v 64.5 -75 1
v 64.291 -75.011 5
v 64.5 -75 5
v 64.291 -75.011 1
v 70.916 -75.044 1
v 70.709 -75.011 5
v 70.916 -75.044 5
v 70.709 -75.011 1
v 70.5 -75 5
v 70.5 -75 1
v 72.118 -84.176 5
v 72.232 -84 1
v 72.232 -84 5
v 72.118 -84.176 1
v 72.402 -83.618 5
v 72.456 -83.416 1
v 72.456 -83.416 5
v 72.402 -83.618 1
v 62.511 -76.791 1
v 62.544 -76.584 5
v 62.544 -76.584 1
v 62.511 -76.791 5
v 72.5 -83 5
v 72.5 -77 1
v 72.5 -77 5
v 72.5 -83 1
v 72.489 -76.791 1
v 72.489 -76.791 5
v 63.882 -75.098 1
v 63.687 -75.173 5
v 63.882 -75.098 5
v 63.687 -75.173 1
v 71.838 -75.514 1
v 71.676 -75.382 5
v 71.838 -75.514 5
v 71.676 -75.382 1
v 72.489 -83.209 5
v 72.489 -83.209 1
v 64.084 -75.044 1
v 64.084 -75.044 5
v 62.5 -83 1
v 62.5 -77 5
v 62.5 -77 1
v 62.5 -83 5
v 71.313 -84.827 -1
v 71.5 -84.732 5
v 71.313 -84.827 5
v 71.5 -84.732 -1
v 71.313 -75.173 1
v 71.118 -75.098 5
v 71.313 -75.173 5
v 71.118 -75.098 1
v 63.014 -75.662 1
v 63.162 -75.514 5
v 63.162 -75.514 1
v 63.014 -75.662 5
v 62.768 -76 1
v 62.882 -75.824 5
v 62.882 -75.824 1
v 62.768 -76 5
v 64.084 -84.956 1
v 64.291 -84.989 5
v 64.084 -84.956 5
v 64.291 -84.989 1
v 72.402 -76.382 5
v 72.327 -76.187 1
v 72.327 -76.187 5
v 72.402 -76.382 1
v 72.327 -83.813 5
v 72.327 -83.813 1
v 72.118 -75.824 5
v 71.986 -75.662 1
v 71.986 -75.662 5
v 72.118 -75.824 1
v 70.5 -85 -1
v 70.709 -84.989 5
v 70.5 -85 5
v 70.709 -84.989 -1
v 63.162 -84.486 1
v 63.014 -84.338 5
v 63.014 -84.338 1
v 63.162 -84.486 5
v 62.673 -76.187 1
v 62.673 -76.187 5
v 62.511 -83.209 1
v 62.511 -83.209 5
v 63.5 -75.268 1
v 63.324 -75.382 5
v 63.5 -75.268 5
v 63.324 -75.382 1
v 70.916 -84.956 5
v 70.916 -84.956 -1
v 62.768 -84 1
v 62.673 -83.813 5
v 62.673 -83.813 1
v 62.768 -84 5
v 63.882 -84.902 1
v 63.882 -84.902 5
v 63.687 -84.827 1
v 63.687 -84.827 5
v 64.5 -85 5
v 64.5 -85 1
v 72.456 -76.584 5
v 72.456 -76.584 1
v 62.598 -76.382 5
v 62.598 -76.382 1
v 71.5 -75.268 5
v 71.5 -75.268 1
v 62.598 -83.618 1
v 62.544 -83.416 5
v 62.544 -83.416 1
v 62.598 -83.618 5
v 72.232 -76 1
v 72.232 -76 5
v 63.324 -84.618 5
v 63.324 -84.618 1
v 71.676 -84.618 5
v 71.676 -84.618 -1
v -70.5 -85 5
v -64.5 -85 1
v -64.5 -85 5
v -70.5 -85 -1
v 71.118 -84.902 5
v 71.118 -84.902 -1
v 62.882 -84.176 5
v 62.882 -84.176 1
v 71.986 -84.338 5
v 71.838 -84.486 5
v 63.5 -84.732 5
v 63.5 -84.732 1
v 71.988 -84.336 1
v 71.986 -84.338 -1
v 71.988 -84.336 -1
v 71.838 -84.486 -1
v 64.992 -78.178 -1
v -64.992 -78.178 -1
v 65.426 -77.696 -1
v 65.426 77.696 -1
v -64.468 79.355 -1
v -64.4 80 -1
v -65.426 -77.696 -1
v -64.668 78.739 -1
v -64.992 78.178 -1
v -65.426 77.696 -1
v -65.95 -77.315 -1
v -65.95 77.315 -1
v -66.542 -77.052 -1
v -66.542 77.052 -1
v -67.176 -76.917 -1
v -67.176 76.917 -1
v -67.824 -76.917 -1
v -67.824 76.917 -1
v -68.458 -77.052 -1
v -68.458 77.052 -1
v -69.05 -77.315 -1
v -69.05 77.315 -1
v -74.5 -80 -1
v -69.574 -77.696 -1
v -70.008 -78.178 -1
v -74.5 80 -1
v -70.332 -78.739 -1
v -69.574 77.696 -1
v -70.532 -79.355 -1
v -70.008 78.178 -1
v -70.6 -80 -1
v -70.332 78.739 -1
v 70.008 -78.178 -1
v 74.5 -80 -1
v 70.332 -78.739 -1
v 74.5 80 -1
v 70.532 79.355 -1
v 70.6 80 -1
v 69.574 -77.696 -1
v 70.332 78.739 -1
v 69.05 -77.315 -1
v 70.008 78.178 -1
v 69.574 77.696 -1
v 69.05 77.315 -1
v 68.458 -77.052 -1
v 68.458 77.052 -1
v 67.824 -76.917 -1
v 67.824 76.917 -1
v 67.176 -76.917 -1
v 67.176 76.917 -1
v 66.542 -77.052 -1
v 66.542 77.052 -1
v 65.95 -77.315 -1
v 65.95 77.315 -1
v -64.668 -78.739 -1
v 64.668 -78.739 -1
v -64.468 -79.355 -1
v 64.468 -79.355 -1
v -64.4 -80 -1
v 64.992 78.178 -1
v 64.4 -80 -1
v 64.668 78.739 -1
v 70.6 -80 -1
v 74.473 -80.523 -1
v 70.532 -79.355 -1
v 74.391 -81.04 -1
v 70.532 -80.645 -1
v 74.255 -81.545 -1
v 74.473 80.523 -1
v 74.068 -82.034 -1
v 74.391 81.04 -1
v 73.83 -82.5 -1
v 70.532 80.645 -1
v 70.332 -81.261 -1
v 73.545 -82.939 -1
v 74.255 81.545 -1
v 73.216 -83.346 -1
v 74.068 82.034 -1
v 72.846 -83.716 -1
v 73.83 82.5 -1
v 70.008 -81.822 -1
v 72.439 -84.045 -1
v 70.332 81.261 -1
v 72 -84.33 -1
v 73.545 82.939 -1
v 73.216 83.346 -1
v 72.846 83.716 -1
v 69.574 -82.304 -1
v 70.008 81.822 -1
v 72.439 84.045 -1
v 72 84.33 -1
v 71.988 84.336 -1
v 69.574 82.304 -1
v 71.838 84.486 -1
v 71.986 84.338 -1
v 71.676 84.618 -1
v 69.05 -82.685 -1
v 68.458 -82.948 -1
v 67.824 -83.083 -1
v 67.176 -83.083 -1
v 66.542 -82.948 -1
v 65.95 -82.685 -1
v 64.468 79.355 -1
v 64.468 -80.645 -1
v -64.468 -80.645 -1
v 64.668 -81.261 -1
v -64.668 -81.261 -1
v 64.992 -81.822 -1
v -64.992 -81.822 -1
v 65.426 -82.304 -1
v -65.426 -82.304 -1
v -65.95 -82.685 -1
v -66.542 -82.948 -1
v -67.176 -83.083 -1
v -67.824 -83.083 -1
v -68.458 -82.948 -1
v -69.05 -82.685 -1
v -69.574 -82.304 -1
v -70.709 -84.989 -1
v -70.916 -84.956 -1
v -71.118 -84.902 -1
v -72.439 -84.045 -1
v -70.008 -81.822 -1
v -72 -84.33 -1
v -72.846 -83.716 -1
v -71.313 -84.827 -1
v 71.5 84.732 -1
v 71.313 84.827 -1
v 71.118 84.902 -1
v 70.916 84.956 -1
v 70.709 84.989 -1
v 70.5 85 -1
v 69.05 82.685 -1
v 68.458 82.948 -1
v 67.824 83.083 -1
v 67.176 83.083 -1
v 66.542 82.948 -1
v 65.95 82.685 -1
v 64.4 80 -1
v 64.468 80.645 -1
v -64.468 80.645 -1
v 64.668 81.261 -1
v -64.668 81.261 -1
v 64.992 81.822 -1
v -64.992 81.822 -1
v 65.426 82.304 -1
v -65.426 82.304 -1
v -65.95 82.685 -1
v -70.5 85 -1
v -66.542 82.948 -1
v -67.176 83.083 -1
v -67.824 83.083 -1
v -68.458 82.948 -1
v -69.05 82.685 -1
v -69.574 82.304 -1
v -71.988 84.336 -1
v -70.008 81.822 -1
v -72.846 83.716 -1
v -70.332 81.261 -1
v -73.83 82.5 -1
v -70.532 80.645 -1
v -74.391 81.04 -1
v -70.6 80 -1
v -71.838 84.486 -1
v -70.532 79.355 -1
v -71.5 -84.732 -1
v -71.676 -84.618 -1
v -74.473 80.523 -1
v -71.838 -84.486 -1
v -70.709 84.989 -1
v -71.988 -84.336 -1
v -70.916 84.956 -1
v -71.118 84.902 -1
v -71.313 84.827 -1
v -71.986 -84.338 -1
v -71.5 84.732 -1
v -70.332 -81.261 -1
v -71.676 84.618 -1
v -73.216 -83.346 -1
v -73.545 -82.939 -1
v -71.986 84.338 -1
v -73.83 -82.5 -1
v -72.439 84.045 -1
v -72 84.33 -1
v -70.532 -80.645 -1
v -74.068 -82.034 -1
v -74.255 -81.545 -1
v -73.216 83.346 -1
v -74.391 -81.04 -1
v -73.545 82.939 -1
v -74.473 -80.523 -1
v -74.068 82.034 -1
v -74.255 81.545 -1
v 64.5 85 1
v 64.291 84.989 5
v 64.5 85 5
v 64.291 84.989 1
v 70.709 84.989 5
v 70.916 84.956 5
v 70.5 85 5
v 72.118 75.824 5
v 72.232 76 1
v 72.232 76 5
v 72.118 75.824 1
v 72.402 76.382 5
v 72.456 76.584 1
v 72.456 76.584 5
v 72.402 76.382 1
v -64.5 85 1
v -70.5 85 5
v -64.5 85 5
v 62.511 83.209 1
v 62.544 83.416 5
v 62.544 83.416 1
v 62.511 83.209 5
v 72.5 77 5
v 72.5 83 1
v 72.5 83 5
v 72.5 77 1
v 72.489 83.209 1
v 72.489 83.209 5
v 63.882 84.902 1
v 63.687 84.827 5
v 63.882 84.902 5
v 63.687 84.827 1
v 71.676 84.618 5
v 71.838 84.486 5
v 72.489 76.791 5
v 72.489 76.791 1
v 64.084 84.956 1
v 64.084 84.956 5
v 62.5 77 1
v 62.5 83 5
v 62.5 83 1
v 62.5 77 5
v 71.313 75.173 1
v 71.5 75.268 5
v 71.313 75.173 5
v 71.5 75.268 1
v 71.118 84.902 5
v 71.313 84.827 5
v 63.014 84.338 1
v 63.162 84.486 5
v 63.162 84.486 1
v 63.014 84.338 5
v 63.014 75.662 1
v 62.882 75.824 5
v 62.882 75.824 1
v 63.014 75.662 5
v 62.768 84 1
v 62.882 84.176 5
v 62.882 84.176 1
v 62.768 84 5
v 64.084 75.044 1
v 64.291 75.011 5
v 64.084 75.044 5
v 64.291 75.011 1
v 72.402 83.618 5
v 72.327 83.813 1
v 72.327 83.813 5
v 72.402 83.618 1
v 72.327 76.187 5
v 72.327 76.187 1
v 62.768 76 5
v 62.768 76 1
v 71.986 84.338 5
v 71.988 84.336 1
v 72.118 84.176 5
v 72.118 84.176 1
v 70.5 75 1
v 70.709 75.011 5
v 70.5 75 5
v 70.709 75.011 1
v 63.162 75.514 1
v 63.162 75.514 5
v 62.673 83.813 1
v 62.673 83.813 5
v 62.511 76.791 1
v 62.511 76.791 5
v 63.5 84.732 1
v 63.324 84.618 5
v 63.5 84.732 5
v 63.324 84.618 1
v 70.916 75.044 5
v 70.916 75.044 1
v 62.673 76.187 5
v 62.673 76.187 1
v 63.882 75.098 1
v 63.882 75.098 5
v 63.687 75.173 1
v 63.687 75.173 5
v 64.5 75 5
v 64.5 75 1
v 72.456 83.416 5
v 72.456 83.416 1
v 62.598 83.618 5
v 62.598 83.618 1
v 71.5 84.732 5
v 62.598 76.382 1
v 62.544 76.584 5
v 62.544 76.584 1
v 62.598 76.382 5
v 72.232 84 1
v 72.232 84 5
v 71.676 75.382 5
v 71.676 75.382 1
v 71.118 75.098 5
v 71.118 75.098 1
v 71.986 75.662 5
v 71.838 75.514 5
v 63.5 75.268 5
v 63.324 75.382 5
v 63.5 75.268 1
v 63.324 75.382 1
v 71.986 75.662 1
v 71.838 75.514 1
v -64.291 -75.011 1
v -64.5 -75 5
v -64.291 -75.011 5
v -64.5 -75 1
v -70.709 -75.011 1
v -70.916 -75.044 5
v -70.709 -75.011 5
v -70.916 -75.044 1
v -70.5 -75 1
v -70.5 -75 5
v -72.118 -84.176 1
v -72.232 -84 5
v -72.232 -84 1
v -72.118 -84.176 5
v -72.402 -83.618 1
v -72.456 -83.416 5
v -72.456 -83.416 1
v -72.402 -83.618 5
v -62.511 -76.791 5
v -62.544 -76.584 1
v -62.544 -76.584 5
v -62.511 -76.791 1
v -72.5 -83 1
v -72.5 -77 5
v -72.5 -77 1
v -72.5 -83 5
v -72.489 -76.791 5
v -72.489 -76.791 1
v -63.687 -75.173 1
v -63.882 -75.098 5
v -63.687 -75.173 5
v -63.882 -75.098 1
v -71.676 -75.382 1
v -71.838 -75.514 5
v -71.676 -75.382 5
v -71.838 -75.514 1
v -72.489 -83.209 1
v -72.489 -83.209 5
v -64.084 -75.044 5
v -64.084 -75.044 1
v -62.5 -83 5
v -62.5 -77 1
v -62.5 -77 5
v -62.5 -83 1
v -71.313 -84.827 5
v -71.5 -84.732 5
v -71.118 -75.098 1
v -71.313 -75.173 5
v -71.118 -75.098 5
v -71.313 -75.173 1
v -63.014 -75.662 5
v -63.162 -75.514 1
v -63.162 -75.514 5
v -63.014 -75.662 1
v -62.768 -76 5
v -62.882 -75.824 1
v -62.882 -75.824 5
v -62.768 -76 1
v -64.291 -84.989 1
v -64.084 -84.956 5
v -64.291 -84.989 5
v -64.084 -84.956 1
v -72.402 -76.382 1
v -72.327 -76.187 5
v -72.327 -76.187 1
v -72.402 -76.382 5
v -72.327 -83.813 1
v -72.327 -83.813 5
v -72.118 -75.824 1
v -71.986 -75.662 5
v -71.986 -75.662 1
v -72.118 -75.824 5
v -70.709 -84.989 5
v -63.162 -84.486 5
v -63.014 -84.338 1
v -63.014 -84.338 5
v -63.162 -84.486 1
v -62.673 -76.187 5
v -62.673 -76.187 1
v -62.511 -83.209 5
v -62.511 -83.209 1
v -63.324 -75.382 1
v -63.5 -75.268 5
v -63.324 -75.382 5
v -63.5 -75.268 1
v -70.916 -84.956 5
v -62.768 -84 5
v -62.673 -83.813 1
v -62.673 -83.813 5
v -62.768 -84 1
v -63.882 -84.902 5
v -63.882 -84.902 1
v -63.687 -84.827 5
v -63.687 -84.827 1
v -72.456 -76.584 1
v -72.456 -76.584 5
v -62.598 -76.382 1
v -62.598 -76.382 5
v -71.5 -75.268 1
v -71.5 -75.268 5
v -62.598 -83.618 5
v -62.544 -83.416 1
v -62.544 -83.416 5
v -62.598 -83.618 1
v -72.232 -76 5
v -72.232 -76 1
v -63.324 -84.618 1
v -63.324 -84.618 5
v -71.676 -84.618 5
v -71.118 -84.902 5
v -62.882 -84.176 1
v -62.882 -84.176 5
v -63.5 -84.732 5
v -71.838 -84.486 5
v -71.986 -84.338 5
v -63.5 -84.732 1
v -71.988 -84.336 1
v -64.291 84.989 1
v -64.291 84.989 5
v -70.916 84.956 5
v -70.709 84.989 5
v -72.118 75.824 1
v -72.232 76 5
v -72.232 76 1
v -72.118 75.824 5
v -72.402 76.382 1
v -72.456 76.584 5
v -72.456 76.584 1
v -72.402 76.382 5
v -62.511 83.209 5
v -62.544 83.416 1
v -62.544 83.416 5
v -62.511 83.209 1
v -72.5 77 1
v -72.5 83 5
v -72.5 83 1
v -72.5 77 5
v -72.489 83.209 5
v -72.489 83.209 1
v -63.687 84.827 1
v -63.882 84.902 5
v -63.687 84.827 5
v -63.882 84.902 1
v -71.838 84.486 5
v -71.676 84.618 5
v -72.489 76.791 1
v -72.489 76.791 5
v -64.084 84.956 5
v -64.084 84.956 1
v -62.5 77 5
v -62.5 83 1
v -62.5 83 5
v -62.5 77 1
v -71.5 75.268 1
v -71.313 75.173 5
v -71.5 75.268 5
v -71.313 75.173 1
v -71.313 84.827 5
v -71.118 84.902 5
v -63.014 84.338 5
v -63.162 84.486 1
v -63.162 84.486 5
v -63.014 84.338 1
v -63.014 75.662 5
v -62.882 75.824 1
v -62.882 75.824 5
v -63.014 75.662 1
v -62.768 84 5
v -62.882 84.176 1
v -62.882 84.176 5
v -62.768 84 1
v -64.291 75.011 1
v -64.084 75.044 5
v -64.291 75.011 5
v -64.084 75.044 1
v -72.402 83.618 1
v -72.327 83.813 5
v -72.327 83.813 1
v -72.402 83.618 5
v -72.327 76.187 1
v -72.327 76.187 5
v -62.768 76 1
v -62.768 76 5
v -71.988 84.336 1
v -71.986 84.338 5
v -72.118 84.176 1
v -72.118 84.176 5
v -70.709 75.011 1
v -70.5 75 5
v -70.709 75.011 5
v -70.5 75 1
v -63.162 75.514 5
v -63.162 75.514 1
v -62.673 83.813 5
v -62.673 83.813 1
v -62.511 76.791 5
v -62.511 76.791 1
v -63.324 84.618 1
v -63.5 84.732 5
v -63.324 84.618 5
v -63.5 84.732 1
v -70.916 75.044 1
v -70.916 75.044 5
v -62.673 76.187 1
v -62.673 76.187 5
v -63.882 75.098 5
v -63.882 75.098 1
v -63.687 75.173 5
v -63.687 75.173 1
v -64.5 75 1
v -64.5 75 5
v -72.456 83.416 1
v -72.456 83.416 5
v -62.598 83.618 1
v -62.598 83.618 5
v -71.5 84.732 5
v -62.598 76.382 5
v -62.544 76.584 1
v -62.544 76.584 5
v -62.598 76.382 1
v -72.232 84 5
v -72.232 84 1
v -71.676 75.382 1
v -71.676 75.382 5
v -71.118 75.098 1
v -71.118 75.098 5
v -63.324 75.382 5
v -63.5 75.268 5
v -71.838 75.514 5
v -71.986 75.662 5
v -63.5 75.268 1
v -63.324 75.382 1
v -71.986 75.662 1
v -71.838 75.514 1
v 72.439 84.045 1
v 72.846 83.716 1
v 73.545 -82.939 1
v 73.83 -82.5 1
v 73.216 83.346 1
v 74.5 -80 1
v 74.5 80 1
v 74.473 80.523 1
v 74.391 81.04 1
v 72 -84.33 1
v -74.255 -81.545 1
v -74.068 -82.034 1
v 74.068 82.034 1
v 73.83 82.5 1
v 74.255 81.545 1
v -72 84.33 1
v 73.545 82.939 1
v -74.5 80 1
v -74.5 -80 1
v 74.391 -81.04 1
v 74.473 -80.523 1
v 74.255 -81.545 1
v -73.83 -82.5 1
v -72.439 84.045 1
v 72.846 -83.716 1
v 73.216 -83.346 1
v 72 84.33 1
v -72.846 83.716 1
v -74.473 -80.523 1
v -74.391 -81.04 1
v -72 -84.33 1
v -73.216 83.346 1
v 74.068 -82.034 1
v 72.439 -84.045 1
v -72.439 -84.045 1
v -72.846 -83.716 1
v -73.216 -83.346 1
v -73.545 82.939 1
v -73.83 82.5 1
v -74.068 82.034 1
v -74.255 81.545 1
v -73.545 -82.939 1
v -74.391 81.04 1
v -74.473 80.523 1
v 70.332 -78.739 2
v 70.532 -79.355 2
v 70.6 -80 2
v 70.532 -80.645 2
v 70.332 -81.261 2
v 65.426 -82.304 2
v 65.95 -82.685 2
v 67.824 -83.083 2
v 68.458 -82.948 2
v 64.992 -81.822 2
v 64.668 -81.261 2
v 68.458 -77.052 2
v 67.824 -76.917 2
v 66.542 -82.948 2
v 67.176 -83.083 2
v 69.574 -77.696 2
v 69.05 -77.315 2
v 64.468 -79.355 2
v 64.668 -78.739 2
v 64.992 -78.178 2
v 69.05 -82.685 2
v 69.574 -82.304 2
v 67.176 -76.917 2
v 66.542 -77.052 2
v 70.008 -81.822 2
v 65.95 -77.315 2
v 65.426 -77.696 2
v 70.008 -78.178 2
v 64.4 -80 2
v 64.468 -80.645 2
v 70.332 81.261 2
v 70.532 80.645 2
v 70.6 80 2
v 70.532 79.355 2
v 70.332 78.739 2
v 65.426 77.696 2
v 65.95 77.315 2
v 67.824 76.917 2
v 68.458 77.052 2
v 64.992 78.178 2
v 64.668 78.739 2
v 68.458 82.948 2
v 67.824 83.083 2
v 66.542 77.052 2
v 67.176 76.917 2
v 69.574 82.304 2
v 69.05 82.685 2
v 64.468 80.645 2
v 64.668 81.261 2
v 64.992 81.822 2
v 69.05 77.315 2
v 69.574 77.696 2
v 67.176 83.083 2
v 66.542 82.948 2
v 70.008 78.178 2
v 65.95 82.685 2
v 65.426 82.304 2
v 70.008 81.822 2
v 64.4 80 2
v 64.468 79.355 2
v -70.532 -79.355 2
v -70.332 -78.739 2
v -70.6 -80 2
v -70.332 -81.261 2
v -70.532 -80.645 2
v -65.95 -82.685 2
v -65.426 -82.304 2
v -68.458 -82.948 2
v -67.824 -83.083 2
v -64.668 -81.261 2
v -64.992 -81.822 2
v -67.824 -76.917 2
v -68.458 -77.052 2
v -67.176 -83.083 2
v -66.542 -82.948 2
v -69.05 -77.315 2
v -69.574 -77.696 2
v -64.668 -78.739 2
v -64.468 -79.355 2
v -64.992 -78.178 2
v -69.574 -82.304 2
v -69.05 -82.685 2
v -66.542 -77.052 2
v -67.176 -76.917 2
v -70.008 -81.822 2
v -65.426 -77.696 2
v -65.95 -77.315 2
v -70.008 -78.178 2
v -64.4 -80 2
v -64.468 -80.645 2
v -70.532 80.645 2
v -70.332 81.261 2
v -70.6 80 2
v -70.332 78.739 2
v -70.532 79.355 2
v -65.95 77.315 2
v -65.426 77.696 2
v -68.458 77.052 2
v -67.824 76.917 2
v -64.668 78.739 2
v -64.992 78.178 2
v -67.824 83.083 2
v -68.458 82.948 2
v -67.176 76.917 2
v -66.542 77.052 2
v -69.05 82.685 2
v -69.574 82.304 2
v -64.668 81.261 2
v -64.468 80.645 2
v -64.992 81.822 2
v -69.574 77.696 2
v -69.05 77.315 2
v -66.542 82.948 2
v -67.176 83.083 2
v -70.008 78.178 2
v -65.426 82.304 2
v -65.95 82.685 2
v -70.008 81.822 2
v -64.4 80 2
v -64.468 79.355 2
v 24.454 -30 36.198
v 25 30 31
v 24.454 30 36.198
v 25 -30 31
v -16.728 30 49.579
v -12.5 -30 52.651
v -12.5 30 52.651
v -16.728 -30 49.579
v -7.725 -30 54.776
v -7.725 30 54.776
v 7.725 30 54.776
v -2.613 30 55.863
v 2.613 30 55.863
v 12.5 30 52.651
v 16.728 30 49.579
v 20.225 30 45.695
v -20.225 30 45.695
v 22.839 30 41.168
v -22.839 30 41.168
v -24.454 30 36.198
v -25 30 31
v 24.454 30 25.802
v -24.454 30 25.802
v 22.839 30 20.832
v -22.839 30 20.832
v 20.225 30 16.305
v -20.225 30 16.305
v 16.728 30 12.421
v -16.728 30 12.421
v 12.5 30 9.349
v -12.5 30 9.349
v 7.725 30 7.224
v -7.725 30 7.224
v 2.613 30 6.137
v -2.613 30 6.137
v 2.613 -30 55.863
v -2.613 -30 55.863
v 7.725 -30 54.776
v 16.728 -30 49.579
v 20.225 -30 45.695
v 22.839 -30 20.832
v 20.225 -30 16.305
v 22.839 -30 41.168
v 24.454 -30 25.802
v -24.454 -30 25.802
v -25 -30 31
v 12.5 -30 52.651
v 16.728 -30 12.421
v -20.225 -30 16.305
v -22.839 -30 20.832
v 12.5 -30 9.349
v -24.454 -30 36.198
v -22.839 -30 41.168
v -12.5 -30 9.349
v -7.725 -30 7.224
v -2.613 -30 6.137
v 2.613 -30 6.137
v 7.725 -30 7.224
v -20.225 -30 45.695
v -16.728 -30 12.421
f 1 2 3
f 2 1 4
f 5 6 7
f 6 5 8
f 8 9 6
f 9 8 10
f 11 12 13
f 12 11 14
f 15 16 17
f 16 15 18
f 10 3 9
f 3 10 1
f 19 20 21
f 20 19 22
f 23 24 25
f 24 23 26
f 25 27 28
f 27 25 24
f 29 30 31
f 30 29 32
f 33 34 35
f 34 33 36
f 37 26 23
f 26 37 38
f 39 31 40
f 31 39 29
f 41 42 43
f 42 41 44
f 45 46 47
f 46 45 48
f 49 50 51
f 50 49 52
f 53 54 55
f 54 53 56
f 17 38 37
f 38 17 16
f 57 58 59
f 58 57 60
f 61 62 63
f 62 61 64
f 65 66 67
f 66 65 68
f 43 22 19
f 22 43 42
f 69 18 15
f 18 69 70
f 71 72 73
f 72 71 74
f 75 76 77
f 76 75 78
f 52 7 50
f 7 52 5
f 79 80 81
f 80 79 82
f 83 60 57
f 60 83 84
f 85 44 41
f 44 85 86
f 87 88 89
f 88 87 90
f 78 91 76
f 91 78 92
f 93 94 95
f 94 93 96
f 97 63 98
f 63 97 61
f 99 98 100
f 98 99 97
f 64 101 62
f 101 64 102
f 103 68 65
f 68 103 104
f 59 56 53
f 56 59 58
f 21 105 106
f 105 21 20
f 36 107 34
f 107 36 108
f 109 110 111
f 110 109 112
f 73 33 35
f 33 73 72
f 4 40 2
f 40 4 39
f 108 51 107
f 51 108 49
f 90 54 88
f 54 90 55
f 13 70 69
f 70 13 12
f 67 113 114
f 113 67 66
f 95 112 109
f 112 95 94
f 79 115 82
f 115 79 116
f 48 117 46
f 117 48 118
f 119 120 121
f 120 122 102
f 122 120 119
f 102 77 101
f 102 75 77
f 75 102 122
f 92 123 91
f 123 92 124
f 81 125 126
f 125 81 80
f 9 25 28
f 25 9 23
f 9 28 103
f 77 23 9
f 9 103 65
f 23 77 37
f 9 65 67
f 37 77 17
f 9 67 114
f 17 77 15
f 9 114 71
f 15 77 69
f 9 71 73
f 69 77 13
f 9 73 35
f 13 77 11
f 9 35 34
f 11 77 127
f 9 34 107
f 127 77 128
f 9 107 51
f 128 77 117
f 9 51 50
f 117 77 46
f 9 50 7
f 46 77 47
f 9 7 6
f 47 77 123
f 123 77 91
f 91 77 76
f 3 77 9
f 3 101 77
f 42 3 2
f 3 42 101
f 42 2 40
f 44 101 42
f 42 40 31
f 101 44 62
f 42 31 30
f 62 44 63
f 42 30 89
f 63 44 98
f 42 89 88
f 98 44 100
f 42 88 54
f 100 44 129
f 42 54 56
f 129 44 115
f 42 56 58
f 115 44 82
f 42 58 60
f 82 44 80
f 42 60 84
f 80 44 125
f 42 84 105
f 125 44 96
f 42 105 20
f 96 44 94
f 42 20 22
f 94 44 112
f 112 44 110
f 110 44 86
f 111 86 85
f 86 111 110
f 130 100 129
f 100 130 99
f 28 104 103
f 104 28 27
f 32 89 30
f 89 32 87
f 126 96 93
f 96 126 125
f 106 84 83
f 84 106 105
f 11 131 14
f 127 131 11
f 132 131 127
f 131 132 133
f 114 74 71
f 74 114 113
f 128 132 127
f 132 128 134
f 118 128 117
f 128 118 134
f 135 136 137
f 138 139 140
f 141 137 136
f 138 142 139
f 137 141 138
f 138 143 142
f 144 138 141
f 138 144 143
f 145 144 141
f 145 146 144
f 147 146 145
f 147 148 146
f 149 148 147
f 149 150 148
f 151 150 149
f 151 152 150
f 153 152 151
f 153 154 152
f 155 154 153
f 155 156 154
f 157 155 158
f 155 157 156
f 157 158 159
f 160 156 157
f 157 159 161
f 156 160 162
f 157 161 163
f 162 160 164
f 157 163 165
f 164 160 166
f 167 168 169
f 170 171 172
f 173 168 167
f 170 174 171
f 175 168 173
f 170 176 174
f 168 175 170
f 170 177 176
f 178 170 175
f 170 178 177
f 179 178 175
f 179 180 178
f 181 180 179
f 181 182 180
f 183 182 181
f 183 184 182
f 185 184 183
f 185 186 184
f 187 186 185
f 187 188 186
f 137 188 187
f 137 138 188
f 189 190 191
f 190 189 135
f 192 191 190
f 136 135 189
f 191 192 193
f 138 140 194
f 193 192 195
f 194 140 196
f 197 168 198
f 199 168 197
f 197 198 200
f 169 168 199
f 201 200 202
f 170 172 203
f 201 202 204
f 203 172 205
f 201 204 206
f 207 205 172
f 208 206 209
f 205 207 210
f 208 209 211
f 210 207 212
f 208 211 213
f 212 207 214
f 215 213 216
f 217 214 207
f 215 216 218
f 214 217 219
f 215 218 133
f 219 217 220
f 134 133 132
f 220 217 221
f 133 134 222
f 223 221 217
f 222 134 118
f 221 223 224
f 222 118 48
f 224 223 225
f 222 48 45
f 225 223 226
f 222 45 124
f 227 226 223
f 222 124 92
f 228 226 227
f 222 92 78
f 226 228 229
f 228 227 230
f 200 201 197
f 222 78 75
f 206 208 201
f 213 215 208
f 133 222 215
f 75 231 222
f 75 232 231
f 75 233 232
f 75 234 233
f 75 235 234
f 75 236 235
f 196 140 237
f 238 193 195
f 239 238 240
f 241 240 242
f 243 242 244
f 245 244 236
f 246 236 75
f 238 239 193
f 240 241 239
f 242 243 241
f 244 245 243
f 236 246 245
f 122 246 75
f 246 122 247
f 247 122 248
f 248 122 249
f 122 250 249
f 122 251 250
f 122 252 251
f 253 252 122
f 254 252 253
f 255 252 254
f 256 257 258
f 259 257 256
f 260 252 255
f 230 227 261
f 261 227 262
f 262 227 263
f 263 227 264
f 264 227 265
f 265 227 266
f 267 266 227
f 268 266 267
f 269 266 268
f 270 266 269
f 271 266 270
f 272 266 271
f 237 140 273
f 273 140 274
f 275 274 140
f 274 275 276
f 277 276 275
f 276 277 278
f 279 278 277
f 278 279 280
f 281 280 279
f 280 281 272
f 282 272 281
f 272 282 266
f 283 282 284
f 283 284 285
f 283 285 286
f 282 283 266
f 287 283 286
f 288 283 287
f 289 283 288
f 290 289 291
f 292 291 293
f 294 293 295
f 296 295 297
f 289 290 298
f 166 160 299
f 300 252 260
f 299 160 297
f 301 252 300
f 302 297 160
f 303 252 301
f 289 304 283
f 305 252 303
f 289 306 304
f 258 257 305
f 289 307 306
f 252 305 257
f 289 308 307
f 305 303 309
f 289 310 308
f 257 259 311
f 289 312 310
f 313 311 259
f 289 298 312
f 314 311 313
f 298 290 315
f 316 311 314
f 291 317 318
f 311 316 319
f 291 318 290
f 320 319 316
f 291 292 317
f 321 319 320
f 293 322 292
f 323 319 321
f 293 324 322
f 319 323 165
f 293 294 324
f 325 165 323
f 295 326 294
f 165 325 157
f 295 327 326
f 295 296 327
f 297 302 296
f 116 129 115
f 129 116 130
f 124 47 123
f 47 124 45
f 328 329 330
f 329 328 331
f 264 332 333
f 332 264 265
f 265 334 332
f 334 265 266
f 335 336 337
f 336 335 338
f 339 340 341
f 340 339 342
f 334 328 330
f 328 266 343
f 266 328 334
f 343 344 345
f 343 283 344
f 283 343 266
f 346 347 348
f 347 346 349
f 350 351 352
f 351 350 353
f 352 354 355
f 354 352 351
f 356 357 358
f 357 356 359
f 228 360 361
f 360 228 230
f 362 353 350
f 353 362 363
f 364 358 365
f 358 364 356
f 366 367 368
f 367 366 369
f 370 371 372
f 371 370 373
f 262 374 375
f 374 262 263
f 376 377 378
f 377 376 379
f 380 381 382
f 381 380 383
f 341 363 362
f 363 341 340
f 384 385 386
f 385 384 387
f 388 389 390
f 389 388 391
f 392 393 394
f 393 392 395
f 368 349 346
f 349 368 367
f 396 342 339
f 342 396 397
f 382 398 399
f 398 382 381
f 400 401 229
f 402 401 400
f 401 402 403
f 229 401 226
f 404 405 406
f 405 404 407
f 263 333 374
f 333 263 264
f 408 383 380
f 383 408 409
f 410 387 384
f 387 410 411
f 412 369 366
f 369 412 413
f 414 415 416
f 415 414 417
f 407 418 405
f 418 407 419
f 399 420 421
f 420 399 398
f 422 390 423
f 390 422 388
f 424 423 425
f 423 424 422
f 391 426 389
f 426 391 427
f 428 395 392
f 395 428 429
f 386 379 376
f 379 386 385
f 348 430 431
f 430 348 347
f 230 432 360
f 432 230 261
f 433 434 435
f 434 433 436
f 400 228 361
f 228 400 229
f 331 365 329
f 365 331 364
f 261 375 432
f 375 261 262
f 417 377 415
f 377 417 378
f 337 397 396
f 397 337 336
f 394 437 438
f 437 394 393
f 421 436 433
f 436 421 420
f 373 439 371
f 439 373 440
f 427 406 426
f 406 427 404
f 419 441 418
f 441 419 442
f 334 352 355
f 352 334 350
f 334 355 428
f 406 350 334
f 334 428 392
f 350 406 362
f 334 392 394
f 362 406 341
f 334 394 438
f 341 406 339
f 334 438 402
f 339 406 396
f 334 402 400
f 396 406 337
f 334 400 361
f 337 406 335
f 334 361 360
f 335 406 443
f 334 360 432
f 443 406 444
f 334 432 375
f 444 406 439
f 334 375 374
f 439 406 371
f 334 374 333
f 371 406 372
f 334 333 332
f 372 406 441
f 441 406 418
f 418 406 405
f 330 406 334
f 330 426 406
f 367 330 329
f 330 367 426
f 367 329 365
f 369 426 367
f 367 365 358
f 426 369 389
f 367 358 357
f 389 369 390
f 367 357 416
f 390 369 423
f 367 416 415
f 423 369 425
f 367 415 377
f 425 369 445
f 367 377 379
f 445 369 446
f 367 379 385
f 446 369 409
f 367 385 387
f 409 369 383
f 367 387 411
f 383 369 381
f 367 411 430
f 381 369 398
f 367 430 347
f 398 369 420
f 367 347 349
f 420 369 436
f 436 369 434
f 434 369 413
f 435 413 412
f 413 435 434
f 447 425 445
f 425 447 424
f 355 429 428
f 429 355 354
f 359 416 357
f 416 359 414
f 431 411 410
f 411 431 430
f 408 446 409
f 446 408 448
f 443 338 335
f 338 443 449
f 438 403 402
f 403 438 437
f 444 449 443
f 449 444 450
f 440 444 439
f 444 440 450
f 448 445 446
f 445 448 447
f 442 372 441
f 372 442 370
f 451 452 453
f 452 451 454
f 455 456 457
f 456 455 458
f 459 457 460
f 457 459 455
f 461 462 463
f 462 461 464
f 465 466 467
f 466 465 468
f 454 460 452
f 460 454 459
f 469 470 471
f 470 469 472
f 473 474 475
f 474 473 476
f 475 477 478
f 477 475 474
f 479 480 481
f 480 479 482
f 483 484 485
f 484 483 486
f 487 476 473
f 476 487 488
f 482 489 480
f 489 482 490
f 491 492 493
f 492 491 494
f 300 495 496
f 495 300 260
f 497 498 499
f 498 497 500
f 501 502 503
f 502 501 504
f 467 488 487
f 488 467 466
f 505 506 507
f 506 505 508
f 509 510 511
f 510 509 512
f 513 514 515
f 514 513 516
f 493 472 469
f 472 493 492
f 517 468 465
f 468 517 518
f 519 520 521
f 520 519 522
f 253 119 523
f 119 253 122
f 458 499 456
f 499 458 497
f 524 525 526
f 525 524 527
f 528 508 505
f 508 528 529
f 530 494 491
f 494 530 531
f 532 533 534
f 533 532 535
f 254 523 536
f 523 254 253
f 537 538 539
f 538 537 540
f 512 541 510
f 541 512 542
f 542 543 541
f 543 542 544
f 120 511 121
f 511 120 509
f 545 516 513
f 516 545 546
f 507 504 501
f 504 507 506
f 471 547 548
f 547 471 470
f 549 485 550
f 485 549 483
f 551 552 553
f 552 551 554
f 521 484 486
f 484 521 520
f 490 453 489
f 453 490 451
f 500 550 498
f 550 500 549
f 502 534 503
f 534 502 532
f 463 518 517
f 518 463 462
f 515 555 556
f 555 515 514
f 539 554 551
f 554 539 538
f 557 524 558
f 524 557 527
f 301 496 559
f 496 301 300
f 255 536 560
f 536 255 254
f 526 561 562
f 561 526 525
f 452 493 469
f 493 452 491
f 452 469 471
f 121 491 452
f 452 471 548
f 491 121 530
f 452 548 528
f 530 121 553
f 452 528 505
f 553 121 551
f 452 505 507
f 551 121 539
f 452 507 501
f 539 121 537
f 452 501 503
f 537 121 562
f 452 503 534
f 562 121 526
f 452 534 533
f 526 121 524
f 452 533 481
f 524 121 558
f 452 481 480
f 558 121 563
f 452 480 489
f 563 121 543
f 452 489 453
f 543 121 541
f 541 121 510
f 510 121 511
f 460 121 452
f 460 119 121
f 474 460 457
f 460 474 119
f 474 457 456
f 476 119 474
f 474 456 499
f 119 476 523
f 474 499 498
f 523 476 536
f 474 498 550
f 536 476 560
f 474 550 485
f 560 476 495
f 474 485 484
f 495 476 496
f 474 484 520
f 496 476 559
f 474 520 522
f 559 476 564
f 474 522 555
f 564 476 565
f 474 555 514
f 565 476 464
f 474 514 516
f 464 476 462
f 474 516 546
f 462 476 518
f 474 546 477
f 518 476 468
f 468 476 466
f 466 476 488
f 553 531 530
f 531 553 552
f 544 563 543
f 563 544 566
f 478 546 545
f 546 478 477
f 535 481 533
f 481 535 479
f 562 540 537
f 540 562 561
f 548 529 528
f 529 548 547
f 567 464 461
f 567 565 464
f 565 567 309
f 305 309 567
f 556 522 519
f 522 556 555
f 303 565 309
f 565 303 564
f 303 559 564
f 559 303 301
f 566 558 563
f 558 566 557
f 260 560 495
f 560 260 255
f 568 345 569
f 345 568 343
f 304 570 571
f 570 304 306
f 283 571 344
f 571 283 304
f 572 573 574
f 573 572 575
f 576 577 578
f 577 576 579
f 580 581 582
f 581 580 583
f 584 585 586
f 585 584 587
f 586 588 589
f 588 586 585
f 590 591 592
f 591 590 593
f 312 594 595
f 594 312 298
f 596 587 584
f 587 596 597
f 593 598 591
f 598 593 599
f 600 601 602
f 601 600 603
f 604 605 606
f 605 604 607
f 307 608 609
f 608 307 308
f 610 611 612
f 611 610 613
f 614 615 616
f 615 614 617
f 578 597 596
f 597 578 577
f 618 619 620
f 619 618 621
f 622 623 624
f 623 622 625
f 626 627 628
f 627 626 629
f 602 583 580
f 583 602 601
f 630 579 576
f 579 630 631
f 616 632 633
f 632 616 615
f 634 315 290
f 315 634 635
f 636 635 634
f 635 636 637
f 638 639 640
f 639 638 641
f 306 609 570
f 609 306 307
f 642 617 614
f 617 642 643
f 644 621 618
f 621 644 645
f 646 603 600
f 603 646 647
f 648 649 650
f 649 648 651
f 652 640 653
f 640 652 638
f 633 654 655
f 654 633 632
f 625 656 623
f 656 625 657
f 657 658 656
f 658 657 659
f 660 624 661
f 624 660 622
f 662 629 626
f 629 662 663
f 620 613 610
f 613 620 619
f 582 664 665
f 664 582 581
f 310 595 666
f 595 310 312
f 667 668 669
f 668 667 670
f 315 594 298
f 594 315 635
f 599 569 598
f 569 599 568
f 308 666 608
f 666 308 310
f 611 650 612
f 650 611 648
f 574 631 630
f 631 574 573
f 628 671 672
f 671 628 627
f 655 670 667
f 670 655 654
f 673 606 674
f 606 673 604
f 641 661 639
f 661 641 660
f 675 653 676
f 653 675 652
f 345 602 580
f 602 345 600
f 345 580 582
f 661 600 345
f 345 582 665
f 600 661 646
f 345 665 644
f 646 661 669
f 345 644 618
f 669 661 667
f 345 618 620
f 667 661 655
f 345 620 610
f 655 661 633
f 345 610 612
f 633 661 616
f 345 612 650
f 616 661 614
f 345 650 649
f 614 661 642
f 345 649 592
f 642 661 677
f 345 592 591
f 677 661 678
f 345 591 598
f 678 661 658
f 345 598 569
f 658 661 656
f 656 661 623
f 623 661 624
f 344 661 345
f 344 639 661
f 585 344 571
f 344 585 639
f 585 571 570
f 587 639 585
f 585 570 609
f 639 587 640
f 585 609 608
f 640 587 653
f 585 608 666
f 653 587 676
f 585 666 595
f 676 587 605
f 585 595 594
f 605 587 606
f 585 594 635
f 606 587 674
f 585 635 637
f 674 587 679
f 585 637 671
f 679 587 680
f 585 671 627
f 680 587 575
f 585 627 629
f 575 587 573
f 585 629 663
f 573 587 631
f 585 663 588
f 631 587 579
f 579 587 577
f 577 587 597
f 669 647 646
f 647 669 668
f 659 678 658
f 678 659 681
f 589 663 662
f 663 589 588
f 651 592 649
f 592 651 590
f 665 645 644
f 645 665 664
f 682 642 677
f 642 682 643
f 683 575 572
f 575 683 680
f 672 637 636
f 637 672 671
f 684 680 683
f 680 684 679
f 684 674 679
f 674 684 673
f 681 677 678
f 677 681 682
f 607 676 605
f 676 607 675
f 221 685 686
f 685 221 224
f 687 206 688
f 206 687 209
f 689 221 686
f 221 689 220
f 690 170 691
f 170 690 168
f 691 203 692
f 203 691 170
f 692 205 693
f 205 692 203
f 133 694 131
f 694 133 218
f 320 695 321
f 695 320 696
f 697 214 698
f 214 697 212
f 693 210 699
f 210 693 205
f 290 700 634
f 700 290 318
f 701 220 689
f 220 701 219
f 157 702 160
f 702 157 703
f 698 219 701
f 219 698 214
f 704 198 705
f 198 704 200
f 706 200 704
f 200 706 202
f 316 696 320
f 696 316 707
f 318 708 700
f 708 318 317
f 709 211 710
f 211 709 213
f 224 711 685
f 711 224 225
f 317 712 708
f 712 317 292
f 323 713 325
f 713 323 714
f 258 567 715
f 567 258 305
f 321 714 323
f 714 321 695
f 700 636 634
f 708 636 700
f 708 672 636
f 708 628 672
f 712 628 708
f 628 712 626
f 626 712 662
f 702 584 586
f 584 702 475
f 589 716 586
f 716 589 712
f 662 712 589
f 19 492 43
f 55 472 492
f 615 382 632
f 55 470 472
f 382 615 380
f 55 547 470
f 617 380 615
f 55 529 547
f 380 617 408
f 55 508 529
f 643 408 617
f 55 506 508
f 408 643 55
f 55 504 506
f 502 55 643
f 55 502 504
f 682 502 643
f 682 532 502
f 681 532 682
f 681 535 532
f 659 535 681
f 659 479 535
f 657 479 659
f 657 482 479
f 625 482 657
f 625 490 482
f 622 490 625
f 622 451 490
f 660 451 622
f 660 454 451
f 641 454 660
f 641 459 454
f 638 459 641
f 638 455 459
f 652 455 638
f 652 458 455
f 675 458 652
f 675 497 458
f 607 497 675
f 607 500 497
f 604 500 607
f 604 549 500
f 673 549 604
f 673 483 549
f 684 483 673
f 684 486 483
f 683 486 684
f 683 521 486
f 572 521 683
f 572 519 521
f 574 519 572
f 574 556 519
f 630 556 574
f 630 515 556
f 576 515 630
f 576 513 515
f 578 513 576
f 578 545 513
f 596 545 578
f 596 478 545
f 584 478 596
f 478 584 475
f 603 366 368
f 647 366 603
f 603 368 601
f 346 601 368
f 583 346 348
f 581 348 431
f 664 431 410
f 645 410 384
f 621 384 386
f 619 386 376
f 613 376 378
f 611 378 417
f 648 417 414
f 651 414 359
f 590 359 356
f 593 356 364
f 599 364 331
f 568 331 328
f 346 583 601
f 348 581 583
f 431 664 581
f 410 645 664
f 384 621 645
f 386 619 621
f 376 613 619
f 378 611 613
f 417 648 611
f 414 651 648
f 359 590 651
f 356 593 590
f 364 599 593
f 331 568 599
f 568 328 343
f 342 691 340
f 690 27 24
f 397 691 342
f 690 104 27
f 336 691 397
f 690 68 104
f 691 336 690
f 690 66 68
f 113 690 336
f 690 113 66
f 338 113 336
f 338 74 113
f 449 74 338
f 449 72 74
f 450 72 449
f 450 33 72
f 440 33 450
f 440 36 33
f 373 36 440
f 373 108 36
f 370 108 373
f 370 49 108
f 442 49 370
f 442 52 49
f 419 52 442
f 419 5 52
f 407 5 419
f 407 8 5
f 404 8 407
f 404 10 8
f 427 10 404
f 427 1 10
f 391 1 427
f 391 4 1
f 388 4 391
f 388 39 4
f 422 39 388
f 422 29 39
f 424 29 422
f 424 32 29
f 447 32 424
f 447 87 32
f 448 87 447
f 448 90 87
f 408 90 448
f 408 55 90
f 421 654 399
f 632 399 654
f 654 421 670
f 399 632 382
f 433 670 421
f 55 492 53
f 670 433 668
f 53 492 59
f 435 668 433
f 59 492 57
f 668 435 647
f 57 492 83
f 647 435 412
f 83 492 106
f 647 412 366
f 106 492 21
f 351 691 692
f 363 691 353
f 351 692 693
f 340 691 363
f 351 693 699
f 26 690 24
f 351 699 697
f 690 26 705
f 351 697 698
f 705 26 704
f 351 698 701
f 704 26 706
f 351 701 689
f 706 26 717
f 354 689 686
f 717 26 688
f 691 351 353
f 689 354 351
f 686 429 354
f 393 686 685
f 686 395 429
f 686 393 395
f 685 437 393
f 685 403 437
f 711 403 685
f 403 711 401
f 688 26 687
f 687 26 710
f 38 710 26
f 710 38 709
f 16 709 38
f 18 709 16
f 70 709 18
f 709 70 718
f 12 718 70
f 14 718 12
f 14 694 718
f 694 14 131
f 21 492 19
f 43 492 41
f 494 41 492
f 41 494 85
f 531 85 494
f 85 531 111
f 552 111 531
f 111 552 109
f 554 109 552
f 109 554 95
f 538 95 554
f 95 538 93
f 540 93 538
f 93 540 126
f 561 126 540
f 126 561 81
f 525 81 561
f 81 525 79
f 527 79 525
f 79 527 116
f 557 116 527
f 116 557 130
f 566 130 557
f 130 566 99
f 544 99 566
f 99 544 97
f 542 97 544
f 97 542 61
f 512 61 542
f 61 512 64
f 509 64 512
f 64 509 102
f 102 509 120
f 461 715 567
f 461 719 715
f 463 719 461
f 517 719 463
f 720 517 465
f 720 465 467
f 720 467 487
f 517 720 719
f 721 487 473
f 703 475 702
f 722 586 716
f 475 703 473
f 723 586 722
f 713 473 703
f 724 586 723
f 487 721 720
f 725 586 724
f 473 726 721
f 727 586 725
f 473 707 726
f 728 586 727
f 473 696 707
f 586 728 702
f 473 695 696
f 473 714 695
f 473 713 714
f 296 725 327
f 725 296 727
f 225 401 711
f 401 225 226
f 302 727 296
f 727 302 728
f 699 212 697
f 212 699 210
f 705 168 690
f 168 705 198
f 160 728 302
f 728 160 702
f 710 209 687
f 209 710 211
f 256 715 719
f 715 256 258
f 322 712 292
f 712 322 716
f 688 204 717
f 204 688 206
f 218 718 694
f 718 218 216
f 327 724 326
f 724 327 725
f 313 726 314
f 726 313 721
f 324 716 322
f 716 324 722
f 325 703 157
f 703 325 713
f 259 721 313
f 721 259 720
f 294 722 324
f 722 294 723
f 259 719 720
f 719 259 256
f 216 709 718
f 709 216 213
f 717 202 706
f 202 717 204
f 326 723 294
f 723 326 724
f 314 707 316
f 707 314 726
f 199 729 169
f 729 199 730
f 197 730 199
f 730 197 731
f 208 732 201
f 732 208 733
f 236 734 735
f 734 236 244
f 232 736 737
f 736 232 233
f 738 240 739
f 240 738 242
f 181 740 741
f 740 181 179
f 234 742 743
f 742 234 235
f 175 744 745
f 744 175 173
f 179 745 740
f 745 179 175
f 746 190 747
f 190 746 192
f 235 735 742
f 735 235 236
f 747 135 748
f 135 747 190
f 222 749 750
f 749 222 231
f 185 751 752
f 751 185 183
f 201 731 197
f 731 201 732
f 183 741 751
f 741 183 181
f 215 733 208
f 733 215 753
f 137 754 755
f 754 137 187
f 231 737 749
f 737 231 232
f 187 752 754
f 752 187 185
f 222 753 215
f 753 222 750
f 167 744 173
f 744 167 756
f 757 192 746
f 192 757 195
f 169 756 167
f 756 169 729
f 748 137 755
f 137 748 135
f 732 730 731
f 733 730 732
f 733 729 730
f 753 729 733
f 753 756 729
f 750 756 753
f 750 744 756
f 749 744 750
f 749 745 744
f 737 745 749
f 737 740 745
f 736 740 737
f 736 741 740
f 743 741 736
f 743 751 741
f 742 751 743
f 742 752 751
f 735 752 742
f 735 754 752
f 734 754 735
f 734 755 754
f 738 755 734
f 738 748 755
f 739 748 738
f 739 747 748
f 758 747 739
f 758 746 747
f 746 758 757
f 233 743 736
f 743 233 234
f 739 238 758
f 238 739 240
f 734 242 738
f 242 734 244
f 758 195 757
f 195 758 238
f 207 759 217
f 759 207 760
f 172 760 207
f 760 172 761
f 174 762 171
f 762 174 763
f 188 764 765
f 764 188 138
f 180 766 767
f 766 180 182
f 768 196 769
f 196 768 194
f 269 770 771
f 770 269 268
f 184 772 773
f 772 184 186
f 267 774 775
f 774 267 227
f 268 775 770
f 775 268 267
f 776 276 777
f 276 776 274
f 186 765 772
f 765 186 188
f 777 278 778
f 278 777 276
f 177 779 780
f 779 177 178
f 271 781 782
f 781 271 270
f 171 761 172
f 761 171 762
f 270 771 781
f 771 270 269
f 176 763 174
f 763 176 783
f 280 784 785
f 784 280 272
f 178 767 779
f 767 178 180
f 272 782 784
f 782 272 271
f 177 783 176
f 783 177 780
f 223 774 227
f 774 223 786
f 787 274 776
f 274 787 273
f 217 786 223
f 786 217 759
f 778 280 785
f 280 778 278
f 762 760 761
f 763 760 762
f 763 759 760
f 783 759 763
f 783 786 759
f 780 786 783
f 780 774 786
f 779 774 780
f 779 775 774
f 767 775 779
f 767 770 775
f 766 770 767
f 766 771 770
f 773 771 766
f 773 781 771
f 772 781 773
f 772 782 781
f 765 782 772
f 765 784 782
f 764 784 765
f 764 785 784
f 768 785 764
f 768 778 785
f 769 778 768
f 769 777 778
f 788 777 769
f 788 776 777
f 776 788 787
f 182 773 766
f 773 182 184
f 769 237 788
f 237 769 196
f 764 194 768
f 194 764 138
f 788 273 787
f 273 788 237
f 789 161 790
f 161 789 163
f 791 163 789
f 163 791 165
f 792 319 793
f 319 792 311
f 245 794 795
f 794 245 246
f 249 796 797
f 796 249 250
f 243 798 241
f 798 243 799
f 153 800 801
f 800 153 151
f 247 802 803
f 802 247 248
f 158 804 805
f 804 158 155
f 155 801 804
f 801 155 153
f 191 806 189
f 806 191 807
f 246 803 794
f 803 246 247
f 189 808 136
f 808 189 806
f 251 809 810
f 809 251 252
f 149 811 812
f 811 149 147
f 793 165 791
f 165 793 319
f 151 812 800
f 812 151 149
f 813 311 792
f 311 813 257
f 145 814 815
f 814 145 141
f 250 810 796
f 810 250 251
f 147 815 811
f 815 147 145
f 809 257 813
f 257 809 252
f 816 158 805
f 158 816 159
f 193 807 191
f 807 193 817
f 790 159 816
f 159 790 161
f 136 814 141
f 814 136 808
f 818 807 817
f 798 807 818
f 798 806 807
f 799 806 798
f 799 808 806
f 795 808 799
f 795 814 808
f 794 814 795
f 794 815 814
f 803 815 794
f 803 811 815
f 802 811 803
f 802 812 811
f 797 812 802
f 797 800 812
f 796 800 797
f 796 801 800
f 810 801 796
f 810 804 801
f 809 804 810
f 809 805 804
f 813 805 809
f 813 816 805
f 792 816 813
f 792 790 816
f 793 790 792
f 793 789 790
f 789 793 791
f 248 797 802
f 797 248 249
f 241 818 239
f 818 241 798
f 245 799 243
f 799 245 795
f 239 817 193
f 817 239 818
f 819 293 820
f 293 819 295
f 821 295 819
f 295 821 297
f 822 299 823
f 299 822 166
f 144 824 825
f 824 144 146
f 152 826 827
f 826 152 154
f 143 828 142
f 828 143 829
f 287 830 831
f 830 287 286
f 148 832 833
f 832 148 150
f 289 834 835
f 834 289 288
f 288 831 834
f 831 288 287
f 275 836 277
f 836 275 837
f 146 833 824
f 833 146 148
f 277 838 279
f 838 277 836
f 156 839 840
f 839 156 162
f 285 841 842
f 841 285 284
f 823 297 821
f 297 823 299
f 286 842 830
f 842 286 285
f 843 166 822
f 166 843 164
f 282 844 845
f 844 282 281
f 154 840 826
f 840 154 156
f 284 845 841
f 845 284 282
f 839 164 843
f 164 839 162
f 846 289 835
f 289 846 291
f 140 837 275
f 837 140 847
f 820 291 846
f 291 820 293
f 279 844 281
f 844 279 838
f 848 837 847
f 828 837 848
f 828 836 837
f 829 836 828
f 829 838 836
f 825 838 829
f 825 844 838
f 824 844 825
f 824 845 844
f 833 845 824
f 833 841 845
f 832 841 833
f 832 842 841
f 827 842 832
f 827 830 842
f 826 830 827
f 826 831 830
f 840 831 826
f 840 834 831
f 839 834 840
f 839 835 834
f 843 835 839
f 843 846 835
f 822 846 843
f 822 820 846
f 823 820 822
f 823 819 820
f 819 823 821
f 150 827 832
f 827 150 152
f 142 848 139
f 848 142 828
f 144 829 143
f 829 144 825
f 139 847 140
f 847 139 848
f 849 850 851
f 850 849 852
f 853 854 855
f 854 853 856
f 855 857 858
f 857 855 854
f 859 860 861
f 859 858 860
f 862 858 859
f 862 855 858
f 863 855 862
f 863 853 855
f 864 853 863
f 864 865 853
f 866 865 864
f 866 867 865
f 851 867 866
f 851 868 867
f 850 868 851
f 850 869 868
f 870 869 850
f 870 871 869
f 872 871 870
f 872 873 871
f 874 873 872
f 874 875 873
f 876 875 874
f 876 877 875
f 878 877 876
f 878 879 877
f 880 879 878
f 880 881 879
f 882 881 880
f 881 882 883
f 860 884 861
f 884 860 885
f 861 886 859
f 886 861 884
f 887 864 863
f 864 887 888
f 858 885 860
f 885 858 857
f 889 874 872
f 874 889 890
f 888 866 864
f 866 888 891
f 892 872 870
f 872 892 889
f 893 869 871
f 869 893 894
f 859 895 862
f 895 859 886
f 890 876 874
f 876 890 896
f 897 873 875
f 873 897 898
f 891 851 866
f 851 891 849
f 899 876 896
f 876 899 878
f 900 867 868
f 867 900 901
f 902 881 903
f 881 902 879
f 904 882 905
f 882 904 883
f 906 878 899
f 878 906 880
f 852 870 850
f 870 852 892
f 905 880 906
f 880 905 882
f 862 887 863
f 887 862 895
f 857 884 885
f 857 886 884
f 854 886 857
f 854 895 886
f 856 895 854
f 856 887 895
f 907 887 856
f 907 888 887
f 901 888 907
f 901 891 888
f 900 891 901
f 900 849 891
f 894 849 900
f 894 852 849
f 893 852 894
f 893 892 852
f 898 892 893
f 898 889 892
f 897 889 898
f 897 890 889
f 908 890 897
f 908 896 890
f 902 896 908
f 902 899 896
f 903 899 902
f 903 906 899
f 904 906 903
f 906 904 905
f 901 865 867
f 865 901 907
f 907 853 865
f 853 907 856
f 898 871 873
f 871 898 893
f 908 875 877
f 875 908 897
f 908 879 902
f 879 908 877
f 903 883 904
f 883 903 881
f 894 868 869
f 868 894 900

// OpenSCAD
// file: ../core/makerbeam.scad
module makerbeam_end(
    bolt_diam, 
    makerbeam, 
    length=10
) {
    
    // The last part of a MakerBeam along with a a flatheaded bolt for mounting
    
    translate([0,0,length/2+(2/3)*bolt_diam]) 
    rotate([0,90,0]){   // Bring things up to level
        cube([length, makerbeam, makerbeam], center=true);   // MakerBeam
        translate([length/2+(2/3)*bolt_diam,0,0]) rotate([0,-90,0]){
            cylinder(h=length, d=bolt_diam);    // Bolt
            hull(){     // Bolt head
                translate([0,0,(2/3)*bolt_diam]) cylinder(h=0.1, d=bolt_diam);
                cylinder(h=0.2, d=bolt_diam*2);
            }
        }
    }
}
// file: ../core/rounded_cube.scad
module rounded_cube(
    dims, 
    radius=1, 
    outside=false, 
    $fn=60
) {

    new_dims = dims / 2;
    if (outside==true){
        new_dims = [new_dims[0] - radius, new_dims[1] - radius, new_dims[2]];
        points = [  [new_dims[0],-new_dims[1],0], 
                [new_dims[0],new_dims[1],0], 
                [-new_dims[0],new_dims[1],0], 
                [-new_dims[0],-new_dims[1],0] ];
        translate([0,0,-dims[2]/2])
        hull(){
            for (p = points){
                translate(p) cylinder(r=radius, h=dims[2]);
            }
        }
    } else {
        points = [  [new_dims[0],-new_dims[1],0], 
                [new_dims[0],new_dims[1],0], 
                [-new_dims[0],new_dims[1],0], 
                [-new_dims[0],-new_dims[1],0] ];
        translate([0,0,-dims[2]/2])
        hull(){
            for (p = points){
                translate(p) cylinder(r=radius, h=dims[2]);
            }
        }
    }
}
// file: ../core/o_ring.scad
// === Module: O-ring === //
module o_ring(outer_diam, ring_diam) {
    outer_diam = outer_diam + 1;
    rotate([0,0,0])
    rotate_extrude(angle=360) {
        translate([(outer_diam-ring_diam/2)/2, 0])
        circle(d=ring_diam); 
        } // rotate_extrude
    cylinder(d=outer_diam-ring_diam/2, h=ring_diam, center=true);
}
// file: ../core/magnets.scad
function magnet_size_correct(magnet_size) 
    = [ magnet_size[0]+0.4, magnet_size[1]+0.2 ];

module magnets(dims, magnet_size, wall_thick){    
    for (i = [-1,1]){
        translate([i*dims[0]/2,0,0]){
            cylinder(d=magnet_size[0], h=magnet_size[1]);
            }
    }
}

module magnets2(dims, magnet_size, wall_thick){
    for (i=[-1,1]) {
        translate([dims[0]/2,i*dims[1]/2,0]){
            cylinder(d=magnet_size[0], h=magnet_size[1]);
            mirror([0,1,0]) cylinder(d=magnet_size[0], h=magnet_size[1]);
        }
    }
}
// file: ../core/hex.scad
// Developed by ggrieves under a CC-BY license.
// https://www.thingiverse.com/thing:1296149/files

module hex(
    hole, 
    wall, 
    thickness
){
    difference(){
        rotate([0, 0, 30]) cylinder(d = (hole + wall), h = thickness, $fn = 6);
        translate([0, 0, -0.1]) rotate([0, 0, 30]) cylinder(d = hole, h = thickness + 0.2, $fn = 6);
    }
}



module hex_grid(
    dims, 
    hole_diameter, 
    hole_spacing
) {
    a = (hole_diameter + (hole_spacing/2))*sin(60);
    for(x = [hole_diameter/2: a: dims[0]]) {
        for(y = [hole_diameter/2: 2*a*sin(60): dims[1]]) {
            translate([x, y, 0]) hex(hole_diameter, hole_spacing, dims[2]);
            translate([x + a*cos(60), y + a*sin(60), 0]) hex(hole_diameter, hole_spacing, dims[2]);

        }
    }
        
}

module hex_wall(
    dims,
    hole_diameter,
    hole_spacing
){
    dims_rotated = [dims[0], dims[2], dims[1]];
    difference(){
        cube(dims, center=true);
        cube(dims+[-5,2,-5], center=true);
    }
    
    translate([-dims[0]/2,-dims[1]/2,-dims[2]/2])
    intersection(){
        cube(dims);
        rotate([90,0,0])
        translate([0,0,-dims[1]])
        hex_grid(dims_rotated, hole_diameter, hole_spacing);
    }
    
}

module hex_floor(
    dims,
    hole_diameter,
    hole_spacing
){  
    translate([-dims[0]/2,-dims[1]/2,-dims[2]/2])
    intersection(){
        cube(dims);
        hex_grid(dims, hole_diameter, hole_spacing);
    }
    
}

// first arg is vector that defines the bounding box, length, width, height
// second arg in the 'diameter' of the holes. In OpenScad, this refers to the corner-to-corner diameter, not flat-to-flat
// this diameter is 2/sqrt(3) times larger than flat to flat
// third arg is wall thickness.  This also is measured that the corners, not the flats. 
// rotate([90,0,0])
// hex_grid([250, 250, 15], 20, 10);
// hex(1, 0.5, 1.5);
// file: ../core/functions.scad
function add(vector, k) = [ for (vector=vector) vector+k ];
    
function get_points(distances) // A vector of 2
    = [ [-distances[0]/2,-distances[1]/2],
        [distances[0]/2,-distances[1]/2],
        [-distances[0]/2,distances[1]/2],
        [distances[0]/2,distances[1]/2]
    ];

function selector(item, dict) = dict[search([item], dict)[0]];
// file: ../core/cross.scad
module cross(dims, outer_length){
    for (i=[-1,1]) {
        hull(){
            translate([dims[0]/2,i*dims[1]/2,0]) 
            cylinder(h=dims[2], d=outer_length, center=true);
            
            translate([-dims[0]/2,-i*dims[1]/2,0]) 
            cylinder(h=dims[2], d=outer_length, center=true);
        }
    }
}
// file: ../core/corners.scad
use <rounded_cube.scad>;
use <makerbeam.scad>;

module corners(dims, outer_length){
    for (i=[-1,1]) {
        translate([dims[0]/2,i*dims[1]/2,0])
        rounded_cube(
            dims = [outer_length,outer_length,dims[2]],
            radius = 2,
            outside = true
            );
    }
}

module corners_hollow(dims, makerbeam, bolt_diam){
    for (i=[-1,1]) {
        translate([dims[0]/2,i*dims[1]/2,-dims[2]/2])
        makerbeam_end(bolt_diam=bolt_diam, makerbeam=makerbeam, length=dims[2]);
    } 
}

module corner_fillets(
    dims, 
    makerbeam
){
    difference(){
        cube(dims, center=true);
        rounded_cube(dims + [0,0,2], makerbeam, outside=true);
    }
}
// file: ../core/core.scad
include <corners.scad>;
include <cross.scad>;
include <functions.scad>;
include <hex.scad>;
include <magnets.scad>;
include <o_ring.scad>;
include <rounded_cube.scad>;
// file: platform_empty.scad
use <../core/core.scad>;

module platform_empty(
    dims, 
    magnet_dims,
    magnet_size,
    makerbeam,
    top_magnets=false,
) {
    corner_height = magnet_size[1] + 3;
    magnet_dims = [magnet_dims[0], magnet_dims[1], corner_height];
    
    dimsA = [dims[0]-makerbeam-1, dims[1]+makerbeam, dims[2]];
    dimsB = [dims[0]+makerbeam, dims[1]-makerbeam-1, dims[2]];
    difference(){
        union(){
            
            // Plate base + magnet holders
            rounded_cube(dimsA, makerbeam/2, true);
            // rounded_cube(dimsB, makerbeam/2, true);
            translate([0,0,magnet_dims[2]/2-dims[2]/2]){
                corners(magnet_dims, makerbeam); // Corners
                mirror([1,0,0]) corners(magnet_dims, makerbeam); // Corners
            }
        }
               
        // Bottom magnets
        translate([0,0,-dims[2]/2]){
            magnets2([magnet_dims[0], magnet_dims[1], magnet_size[1]+2], magnet_size, 3);
            mirror([1,0,0]) magnets2([magnet_dims[0], magnet_dims[1], magnet_size[1]+2], magnet_size, 3);
        }
        if (top_magnets == true){
            // Bottom magnets
            translate([0,0,corner_height-dims[2]/2]){
                magnets2(magnet_dims, magnet_size, 3);
                mirror([1,0,0]) magnets2(magnet_dims, magnet_size, 3);
        }
    }
  }
}
// main file
use <platform_empty.scad>;
use <../core/core.scad>;

$fn = 30;

/* [General:] */
// combo box for number
wall_thick = 3;
primary_bolt = 3;
secondary_bolt = 2;
makerbeam = 10;
magnet_size = [6.2,3]; // diameter, height
wellplate_dims = [127.63,85.47,2]; 
target_diam = 7;

// Dimensions
dims = [160,160,15]; //normal length
magnet_dims = [dims[0]-25,dims[1],magnet_size[1]*2+wall_thick];
light_chamber_dims = [dims[0],dims[1],50];
platform_dims = [dims[0],dims[1],2];
corner_height = 20;

// [diameter, height, gap width]
chamber_dims = [40,60]; // [
beam_height = 300;

// Camera specs
cam_dims = [40, 40]; // USB: [40,40] - RPi: [30, 25]
lens_diam = 25; // lens hole diameter
standoff_dims = [34,34,10]; // USB: [34,34,10] - RPi: [21,13.5,6];

platform_metabolic_chamber_vertical(
    platform_dims, 
    magnet_dims, 
    chamber_dims,
    magnet_size, 
    makerbeam,
    corner_height
);

module platform_metabolic_chamber_vertical(
    dims, 
    magnet_dims, 
    chamber_dims,
    magnet_size, 
    makerbeam,
    corner_height
) {
    echo(platform_dims);
    chamber_d = chamber_dims[0]+2;
    chamber_h = chamber_dims[1];
    wall_thickness = 4;
    rubber_r = 1;
    
    union(){
        // platform base
        platform_empty(
            dims = dims, 
            magnet_dims = magnet_dims,
            magnet_size = magnet_size, 
            makerbeam = makerbeam,
            corner_height = corner_height
        );
        
        // Translate other stuff on top
        translate([0,0,(chamber_dims[1]+dims[2])/2]){
            // Other stuff
            difference(){
                rotate([90,0,0])
                cylinder(d=chamber_d+2*wall_thickness, h=chamber_h, center=true);
            }
        }
    }
        
}
